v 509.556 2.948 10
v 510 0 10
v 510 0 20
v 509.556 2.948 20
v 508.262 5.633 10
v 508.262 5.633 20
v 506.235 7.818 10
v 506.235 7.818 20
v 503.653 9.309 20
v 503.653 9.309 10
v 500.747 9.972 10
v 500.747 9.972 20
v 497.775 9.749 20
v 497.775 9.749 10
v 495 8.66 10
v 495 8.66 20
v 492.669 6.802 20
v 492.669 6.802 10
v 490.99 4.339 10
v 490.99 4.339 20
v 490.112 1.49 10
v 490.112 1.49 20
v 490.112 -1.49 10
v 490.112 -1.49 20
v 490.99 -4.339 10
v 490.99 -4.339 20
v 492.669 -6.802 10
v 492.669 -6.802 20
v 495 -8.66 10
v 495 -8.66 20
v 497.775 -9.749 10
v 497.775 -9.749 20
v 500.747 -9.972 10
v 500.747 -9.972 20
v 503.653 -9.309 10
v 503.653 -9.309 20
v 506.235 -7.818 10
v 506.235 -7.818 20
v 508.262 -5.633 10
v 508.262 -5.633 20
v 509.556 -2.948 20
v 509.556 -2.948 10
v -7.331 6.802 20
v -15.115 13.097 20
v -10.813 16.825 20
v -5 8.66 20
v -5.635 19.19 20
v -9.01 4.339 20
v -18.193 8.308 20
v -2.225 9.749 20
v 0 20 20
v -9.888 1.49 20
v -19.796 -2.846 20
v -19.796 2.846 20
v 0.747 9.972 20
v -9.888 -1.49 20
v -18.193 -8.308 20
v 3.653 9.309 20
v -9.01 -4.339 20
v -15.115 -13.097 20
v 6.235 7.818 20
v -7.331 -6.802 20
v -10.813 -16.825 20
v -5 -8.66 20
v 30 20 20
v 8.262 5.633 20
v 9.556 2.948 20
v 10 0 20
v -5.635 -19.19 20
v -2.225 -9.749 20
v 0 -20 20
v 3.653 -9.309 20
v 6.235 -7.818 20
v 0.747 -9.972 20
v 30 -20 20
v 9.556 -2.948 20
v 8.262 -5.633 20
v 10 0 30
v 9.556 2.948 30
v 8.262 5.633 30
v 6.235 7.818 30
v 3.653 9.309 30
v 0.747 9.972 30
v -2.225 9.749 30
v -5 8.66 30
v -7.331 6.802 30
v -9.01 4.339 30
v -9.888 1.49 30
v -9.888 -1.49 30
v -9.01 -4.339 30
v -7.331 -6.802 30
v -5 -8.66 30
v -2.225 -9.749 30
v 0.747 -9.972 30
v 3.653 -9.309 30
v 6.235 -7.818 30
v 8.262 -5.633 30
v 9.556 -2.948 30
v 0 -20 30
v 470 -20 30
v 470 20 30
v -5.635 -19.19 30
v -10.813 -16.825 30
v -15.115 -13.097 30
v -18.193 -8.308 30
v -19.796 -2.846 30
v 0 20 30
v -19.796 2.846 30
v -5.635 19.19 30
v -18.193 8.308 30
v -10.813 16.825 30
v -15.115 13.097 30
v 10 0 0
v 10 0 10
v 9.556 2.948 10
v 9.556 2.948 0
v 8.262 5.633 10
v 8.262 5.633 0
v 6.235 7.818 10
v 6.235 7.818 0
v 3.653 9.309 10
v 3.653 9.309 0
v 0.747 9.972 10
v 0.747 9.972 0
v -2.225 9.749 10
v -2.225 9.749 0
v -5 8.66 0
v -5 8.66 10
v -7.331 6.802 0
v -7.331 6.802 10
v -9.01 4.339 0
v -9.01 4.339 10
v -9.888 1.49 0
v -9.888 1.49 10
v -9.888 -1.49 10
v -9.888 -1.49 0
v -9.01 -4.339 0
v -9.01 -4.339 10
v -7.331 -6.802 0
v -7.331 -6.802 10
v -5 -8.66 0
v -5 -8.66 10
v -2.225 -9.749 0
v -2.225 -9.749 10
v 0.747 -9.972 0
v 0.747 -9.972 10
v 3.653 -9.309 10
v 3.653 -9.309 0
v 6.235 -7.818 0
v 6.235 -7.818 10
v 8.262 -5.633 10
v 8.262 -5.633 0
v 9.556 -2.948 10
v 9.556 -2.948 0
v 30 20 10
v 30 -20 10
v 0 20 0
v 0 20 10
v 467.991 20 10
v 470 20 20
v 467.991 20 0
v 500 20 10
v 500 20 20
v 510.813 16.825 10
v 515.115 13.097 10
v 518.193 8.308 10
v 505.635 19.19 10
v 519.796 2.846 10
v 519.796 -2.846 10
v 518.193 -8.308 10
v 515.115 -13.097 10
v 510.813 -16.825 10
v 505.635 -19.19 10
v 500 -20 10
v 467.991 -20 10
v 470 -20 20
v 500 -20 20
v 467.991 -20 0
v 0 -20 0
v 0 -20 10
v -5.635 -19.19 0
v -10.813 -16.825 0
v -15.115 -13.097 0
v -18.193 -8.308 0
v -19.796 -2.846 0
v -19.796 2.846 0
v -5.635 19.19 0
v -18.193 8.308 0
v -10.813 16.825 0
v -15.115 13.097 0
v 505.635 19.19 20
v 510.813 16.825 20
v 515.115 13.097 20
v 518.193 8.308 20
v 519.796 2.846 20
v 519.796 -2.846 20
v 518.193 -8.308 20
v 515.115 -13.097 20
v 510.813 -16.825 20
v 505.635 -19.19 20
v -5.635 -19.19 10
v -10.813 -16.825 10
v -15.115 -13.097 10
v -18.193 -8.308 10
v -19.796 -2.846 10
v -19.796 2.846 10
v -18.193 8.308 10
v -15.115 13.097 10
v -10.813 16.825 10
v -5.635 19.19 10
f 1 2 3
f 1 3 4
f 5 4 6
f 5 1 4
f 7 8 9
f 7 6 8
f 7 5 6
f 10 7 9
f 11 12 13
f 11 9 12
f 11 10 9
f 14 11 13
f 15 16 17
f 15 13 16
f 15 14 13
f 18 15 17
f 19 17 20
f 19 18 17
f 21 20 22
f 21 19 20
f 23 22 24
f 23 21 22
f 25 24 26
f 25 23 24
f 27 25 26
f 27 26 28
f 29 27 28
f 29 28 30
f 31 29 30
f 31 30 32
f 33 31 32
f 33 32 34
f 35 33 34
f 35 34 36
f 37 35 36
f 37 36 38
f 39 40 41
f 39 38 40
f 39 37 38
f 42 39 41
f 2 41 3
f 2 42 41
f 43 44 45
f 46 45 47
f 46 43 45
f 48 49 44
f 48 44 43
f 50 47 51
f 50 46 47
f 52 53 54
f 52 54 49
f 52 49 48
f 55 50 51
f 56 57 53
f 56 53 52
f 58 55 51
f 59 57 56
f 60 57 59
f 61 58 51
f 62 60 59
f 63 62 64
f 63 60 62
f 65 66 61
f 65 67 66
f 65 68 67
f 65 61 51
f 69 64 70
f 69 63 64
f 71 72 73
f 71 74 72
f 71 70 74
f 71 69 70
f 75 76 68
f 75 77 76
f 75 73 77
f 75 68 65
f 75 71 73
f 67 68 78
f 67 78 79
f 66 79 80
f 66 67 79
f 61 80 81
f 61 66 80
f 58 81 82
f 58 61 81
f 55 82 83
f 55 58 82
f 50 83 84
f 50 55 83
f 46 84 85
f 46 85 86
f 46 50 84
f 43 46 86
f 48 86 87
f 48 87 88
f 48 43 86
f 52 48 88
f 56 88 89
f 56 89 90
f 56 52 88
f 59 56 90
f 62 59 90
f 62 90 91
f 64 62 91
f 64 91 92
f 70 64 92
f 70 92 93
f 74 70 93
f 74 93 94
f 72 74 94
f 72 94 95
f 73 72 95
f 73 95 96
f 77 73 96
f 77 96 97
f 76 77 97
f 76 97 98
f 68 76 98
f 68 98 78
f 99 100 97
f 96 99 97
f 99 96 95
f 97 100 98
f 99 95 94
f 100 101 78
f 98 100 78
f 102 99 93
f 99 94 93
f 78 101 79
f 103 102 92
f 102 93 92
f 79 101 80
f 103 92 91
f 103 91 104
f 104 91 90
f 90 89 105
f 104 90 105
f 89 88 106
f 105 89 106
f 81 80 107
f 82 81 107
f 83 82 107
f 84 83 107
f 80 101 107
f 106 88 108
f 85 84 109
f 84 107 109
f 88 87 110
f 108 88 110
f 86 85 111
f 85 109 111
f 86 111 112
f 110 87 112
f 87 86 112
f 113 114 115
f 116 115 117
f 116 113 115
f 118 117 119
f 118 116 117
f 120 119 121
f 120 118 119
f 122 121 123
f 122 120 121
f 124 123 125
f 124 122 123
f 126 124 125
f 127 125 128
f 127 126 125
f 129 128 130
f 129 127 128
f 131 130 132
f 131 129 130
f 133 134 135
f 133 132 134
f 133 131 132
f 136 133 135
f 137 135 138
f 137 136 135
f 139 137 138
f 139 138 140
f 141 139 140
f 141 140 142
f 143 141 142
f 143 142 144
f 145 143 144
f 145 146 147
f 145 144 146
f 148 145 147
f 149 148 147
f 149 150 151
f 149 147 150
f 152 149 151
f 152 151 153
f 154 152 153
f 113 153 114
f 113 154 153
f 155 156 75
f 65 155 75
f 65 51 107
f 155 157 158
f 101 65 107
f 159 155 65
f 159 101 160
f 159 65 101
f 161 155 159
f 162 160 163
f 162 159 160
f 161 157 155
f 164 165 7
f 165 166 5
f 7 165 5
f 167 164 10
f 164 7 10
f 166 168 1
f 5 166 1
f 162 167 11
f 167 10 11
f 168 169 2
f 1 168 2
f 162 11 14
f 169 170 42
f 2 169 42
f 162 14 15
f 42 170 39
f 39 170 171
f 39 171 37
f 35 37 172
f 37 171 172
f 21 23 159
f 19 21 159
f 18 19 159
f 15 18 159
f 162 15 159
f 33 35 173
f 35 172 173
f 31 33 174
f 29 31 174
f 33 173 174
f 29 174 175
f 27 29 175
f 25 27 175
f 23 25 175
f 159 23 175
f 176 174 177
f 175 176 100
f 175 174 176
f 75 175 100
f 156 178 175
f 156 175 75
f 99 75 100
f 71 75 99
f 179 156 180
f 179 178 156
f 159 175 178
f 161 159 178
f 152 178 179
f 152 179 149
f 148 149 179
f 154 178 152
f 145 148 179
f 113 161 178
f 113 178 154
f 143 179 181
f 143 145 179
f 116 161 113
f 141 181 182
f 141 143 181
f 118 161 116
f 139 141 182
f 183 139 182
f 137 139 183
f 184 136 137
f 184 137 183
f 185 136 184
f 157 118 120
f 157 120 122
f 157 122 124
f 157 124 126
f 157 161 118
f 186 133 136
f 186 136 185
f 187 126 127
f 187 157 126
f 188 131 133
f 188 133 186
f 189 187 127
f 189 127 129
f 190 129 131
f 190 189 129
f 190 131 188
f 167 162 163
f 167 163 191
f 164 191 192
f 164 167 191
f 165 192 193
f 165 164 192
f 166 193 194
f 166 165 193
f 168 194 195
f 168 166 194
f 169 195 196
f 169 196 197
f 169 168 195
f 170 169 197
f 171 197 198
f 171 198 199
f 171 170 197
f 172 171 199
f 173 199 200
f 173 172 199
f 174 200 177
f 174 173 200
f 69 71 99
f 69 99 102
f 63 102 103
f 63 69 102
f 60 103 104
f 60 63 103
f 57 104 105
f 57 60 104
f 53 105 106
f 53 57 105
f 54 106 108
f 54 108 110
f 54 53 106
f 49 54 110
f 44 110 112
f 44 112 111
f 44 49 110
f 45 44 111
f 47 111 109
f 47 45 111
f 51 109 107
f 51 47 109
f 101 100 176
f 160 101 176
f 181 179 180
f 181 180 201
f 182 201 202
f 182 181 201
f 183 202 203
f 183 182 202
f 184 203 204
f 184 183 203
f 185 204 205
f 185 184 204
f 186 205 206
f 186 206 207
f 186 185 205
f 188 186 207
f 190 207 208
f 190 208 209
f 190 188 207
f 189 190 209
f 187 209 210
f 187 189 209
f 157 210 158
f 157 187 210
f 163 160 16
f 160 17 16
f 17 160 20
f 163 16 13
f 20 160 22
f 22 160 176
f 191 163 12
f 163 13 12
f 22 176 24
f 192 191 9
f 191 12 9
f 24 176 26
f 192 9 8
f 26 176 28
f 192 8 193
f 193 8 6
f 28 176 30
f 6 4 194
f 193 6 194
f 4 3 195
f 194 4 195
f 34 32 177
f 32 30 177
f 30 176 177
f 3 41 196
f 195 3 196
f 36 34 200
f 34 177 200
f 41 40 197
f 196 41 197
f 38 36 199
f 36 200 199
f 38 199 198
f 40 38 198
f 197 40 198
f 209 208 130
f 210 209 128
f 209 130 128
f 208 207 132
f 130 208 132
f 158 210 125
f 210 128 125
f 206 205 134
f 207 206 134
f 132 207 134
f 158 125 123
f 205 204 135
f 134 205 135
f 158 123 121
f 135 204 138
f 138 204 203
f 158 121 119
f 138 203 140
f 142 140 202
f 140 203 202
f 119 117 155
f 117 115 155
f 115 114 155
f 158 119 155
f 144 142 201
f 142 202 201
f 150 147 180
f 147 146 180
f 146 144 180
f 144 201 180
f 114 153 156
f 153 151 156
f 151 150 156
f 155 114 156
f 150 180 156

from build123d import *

# Parameters (mm, degrees)
SKETCH1_R           = 10
BOSS_EXTRUDE1_DEPTH = 30
SKETCH4_W           = 69.930145124
SKETCH4_H           = 10
CUT_EXTRUDE1_DEPTH  = 523.398315464


with BuildPart() as part:
    # Sketch1 → Boss-Extrude1 (new body)
    with BuildSketch(Plane.XY):
        with BuildLine():
            Line((0, 20), (500, 20))
            ThreePointArc((500, 20), (520, 0), (500, -20))
            Line((500, -20), (0, -20))
            ThreePointArc((0, -20), (-20, 0), (0, 20))
        make_face()
        Circle(SKETCH1_R, mode=Mode.SUBTRACT)
        with Locations((500, 0)):
            Circle(SKETCH1_R, mode=Mode.SUBTRACT)
    extrude(amount=BOSS_EXTRUDE1_DEPTH)

    # Sketch4 → Cut-Extrude1 (cut, through all)
    with BuildSketch(Plane.XZ.offset(20)):
        with Locations((-4.965072562, 15)):
            Rectangle(SKETCH4_W, SKETCH4_H)
        Polygon((470, 47.162996114), (470, 20), (535.290811534, 20), (535.290811534, 10), (467.990842664, 10), (467.990842664, -15.795499521), (553.153388579, -15.795499521), (553.153388579, 47.162996114), align=None)
    extrude(amount=-CUT_EXTRUDE1_DEPTH, mode=Mode.SUBTRACT)


solid = part.part
